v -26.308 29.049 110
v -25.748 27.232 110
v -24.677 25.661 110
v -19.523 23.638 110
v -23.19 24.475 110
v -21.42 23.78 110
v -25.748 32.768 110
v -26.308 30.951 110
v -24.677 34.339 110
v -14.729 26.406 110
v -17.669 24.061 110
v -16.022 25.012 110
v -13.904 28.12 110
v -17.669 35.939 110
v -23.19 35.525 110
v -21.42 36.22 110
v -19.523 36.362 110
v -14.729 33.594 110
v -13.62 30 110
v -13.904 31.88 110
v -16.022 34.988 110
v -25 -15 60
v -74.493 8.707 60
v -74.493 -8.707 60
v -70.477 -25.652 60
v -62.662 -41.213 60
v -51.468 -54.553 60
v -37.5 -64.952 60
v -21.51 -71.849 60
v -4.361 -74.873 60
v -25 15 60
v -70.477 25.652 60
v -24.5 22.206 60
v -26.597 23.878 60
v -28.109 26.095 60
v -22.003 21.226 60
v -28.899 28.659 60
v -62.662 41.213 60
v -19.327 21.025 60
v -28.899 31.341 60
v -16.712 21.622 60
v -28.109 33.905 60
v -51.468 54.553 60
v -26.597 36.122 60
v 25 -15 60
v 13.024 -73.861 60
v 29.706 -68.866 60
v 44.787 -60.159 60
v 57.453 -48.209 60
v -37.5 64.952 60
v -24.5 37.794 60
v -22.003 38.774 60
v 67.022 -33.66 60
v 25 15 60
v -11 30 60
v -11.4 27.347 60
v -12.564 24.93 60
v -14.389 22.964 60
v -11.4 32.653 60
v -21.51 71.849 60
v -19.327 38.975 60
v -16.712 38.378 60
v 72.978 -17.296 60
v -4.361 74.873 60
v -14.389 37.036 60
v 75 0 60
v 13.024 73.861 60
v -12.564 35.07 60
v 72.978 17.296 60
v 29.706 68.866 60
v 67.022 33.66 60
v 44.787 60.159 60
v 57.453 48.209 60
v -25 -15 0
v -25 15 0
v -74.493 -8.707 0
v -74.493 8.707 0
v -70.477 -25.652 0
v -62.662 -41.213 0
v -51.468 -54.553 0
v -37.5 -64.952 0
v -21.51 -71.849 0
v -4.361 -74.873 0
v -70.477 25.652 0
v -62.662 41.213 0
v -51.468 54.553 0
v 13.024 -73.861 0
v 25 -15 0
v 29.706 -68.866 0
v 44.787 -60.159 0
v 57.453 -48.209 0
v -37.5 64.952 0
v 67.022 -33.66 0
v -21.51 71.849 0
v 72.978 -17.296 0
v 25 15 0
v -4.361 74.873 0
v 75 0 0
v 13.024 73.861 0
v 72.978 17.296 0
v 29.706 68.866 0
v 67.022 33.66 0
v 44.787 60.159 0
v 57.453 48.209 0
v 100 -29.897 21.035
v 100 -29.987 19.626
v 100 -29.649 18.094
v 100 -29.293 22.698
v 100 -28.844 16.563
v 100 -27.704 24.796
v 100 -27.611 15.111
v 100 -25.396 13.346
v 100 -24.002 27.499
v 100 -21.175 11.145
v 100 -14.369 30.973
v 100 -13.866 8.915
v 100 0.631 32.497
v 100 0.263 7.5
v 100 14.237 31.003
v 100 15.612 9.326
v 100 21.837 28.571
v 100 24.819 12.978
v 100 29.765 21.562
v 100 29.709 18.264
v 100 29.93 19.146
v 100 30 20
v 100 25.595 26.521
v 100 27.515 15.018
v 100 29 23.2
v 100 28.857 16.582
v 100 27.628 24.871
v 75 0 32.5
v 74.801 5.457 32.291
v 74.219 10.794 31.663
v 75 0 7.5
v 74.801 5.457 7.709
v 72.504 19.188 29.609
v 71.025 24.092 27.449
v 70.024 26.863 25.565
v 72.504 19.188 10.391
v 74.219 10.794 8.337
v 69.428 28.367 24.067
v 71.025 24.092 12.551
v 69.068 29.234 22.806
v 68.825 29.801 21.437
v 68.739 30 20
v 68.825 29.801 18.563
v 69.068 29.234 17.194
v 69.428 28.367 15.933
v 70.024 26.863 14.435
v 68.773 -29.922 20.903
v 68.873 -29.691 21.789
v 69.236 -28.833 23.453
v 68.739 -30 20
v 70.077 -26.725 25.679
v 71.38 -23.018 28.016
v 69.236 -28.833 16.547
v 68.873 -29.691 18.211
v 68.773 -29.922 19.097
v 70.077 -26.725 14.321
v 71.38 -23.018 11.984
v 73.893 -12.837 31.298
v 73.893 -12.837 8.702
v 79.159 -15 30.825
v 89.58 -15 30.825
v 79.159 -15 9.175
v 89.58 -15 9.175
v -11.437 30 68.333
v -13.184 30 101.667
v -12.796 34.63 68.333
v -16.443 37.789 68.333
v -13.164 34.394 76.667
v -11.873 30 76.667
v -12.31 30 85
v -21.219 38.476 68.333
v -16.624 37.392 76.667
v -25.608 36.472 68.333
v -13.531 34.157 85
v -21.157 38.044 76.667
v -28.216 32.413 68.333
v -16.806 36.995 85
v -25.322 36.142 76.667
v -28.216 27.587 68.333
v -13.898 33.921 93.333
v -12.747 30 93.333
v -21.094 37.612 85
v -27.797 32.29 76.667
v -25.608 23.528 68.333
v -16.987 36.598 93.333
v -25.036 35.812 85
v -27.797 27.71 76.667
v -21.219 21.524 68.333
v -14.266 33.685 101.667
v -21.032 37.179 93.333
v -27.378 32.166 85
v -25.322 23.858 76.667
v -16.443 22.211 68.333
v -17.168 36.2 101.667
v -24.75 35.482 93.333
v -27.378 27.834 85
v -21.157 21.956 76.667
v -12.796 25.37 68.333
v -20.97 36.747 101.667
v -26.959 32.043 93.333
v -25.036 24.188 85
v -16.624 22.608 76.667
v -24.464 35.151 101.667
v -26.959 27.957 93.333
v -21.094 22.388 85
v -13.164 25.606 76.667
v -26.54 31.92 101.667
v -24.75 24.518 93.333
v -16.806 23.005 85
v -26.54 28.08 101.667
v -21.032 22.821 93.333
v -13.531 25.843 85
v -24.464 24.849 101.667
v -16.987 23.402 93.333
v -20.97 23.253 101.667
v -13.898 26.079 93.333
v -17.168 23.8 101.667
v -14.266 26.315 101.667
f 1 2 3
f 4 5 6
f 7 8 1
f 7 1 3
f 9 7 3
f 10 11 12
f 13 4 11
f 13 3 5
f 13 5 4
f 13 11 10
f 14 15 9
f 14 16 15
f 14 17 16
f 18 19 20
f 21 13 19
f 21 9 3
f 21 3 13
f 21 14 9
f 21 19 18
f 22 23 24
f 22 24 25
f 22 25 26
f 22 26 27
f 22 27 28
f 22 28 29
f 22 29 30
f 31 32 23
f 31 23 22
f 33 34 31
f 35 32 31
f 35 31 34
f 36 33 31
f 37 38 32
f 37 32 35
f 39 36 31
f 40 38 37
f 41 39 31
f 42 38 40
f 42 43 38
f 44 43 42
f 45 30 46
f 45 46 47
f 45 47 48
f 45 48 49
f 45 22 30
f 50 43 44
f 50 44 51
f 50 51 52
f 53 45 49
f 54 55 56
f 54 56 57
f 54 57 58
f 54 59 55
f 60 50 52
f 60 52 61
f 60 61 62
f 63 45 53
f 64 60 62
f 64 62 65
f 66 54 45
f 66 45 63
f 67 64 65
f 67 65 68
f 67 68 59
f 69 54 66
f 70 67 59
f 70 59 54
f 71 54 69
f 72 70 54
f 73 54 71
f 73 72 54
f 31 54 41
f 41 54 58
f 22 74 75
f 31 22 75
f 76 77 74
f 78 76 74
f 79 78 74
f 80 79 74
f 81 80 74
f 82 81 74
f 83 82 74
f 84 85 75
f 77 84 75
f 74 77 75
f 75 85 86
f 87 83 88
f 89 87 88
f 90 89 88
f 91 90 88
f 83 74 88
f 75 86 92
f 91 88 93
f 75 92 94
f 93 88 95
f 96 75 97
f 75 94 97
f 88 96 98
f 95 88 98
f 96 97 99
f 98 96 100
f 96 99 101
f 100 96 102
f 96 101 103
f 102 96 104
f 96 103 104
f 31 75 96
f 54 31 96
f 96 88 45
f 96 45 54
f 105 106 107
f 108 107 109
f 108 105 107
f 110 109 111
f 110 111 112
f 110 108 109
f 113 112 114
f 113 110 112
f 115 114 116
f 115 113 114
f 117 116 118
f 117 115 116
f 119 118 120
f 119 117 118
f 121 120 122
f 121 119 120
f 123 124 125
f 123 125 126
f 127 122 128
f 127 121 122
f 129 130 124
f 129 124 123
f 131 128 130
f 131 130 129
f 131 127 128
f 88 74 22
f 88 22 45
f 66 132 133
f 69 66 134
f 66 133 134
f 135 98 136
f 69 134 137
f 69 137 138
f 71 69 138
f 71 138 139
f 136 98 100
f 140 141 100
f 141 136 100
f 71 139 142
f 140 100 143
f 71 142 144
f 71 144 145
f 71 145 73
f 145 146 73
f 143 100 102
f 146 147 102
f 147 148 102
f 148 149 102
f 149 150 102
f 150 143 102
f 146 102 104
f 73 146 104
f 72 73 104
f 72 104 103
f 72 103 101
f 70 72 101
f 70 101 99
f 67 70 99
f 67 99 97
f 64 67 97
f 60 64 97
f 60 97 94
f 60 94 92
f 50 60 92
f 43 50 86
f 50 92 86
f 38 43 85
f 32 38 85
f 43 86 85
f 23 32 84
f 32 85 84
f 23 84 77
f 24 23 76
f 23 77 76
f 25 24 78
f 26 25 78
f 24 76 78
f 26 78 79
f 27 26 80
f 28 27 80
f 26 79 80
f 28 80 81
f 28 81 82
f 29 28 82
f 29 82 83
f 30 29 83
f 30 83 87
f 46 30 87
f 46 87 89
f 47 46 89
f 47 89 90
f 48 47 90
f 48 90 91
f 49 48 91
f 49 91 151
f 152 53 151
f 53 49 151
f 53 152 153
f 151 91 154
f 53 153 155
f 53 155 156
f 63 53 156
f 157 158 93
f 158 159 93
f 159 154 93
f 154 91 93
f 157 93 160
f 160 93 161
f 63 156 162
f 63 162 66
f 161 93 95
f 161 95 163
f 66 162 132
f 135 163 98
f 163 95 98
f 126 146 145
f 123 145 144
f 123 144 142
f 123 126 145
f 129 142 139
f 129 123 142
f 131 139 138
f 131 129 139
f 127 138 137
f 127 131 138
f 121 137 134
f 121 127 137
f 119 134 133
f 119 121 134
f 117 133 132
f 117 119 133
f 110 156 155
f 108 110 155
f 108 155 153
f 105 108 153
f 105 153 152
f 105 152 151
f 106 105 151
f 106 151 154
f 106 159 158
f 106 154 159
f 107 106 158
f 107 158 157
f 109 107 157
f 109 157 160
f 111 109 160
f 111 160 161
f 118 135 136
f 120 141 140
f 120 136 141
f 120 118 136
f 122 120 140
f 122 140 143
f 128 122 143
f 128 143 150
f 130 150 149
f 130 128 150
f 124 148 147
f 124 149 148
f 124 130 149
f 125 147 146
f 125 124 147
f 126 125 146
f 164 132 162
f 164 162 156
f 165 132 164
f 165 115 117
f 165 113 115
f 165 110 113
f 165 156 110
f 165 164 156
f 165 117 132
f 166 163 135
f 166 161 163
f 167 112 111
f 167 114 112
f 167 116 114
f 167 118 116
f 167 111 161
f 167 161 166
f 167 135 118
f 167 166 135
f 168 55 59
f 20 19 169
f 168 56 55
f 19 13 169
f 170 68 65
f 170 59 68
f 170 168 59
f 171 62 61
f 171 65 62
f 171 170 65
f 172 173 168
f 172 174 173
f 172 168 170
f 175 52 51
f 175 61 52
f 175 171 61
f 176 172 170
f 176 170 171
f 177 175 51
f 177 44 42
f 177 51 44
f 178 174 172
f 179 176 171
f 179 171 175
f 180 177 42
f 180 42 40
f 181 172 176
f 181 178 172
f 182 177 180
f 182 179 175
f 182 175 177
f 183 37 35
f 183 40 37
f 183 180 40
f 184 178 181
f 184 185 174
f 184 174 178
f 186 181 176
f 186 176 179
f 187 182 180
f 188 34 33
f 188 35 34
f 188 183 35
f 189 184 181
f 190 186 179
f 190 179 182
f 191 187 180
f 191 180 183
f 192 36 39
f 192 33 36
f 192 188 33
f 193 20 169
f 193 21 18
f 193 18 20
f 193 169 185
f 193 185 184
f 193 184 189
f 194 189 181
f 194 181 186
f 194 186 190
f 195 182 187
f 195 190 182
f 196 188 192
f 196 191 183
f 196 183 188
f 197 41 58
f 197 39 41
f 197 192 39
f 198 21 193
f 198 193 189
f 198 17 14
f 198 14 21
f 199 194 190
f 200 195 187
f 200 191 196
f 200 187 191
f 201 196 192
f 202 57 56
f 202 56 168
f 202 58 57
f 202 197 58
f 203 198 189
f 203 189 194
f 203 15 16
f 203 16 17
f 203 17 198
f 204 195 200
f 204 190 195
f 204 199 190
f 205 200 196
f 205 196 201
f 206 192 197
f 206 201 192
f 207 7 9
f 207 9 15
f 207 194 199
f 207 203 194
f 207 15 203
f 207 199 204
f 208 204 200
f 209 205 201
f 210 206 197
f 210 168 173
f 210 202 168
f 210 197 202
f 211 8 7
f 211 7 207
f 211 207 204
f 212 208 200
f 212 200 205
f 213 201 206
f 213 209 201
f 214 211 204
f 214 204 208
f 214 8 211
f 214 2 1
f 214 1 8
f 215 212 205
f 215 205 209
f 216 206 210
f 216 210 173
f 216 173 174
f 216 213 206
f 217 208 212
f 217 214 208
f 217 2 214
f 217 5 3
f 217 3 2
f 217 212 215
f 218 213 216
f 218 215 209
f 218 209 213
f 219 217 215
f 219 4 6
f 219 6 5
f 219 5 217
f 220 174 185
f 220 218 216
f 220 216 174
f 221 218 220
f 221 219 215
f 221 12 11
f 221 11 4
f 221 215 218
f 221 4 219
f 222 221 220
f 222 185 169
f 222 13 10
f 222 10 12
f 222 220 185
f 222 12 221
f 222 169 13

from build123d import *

# Parameters (mm, degrees)
F0_R     = 75
F1_DEPTH = 60
F2_W     = 50
F2_H     = 30
F3_DEPTH = 60.001
F6_DEPTH = 31.2613646757
F7_R     = 9
F8_DEPTH = 50
F8_TAPER = 3


with BuildPart() as f1:
    # F0 (on Top) → F1 (new body)
    with BuildSketch(Plane.XY):
        Circle(F0_R)
    extrude(amount=F1_DEPTH)

    # F2 (on face) → F3 (cut, through all)
    with BuildSketch(Plane.XY.offset(60)):
        Rectangle(F2_W, F2_H)
    extrude(amount=-F3_DEPTH, mode=Mode.SUBTRACT)

    # F5 (on offset) → F6 (join, through all)
    with BuildSketch(Plane.YZ.offset(100)):
        with BuildLine():
            add(Edge.make_bspline(
                [(30, 20), (30, 41.6506350946), (-15, 30.8253175473), (-60, 20), (-15, 9.1746824527), (30, -1.6506350946), (30, 20)],
                knots=[0, 0, 0, 2.0943951024, 2.0943951024, 4.1887902048, 4.1887902048, 6.2831853072, 6.2831853072, 6.2831853072], degree=2, weights=[1, 0.5, 1, 0.5, 1, 0.5, 1]))
        make_face()
    extrude(amount=-F6_DEPTH)

    # F7 (on face) → F8 (join)
    with BuildSketch(Plane.XY.offset(60)):
        with Locations((-20, 30)):
            Circle(F7_R)
    extrude(amount=F8_DEPTH, taper=F8_TAPER)


solid = f1.part
